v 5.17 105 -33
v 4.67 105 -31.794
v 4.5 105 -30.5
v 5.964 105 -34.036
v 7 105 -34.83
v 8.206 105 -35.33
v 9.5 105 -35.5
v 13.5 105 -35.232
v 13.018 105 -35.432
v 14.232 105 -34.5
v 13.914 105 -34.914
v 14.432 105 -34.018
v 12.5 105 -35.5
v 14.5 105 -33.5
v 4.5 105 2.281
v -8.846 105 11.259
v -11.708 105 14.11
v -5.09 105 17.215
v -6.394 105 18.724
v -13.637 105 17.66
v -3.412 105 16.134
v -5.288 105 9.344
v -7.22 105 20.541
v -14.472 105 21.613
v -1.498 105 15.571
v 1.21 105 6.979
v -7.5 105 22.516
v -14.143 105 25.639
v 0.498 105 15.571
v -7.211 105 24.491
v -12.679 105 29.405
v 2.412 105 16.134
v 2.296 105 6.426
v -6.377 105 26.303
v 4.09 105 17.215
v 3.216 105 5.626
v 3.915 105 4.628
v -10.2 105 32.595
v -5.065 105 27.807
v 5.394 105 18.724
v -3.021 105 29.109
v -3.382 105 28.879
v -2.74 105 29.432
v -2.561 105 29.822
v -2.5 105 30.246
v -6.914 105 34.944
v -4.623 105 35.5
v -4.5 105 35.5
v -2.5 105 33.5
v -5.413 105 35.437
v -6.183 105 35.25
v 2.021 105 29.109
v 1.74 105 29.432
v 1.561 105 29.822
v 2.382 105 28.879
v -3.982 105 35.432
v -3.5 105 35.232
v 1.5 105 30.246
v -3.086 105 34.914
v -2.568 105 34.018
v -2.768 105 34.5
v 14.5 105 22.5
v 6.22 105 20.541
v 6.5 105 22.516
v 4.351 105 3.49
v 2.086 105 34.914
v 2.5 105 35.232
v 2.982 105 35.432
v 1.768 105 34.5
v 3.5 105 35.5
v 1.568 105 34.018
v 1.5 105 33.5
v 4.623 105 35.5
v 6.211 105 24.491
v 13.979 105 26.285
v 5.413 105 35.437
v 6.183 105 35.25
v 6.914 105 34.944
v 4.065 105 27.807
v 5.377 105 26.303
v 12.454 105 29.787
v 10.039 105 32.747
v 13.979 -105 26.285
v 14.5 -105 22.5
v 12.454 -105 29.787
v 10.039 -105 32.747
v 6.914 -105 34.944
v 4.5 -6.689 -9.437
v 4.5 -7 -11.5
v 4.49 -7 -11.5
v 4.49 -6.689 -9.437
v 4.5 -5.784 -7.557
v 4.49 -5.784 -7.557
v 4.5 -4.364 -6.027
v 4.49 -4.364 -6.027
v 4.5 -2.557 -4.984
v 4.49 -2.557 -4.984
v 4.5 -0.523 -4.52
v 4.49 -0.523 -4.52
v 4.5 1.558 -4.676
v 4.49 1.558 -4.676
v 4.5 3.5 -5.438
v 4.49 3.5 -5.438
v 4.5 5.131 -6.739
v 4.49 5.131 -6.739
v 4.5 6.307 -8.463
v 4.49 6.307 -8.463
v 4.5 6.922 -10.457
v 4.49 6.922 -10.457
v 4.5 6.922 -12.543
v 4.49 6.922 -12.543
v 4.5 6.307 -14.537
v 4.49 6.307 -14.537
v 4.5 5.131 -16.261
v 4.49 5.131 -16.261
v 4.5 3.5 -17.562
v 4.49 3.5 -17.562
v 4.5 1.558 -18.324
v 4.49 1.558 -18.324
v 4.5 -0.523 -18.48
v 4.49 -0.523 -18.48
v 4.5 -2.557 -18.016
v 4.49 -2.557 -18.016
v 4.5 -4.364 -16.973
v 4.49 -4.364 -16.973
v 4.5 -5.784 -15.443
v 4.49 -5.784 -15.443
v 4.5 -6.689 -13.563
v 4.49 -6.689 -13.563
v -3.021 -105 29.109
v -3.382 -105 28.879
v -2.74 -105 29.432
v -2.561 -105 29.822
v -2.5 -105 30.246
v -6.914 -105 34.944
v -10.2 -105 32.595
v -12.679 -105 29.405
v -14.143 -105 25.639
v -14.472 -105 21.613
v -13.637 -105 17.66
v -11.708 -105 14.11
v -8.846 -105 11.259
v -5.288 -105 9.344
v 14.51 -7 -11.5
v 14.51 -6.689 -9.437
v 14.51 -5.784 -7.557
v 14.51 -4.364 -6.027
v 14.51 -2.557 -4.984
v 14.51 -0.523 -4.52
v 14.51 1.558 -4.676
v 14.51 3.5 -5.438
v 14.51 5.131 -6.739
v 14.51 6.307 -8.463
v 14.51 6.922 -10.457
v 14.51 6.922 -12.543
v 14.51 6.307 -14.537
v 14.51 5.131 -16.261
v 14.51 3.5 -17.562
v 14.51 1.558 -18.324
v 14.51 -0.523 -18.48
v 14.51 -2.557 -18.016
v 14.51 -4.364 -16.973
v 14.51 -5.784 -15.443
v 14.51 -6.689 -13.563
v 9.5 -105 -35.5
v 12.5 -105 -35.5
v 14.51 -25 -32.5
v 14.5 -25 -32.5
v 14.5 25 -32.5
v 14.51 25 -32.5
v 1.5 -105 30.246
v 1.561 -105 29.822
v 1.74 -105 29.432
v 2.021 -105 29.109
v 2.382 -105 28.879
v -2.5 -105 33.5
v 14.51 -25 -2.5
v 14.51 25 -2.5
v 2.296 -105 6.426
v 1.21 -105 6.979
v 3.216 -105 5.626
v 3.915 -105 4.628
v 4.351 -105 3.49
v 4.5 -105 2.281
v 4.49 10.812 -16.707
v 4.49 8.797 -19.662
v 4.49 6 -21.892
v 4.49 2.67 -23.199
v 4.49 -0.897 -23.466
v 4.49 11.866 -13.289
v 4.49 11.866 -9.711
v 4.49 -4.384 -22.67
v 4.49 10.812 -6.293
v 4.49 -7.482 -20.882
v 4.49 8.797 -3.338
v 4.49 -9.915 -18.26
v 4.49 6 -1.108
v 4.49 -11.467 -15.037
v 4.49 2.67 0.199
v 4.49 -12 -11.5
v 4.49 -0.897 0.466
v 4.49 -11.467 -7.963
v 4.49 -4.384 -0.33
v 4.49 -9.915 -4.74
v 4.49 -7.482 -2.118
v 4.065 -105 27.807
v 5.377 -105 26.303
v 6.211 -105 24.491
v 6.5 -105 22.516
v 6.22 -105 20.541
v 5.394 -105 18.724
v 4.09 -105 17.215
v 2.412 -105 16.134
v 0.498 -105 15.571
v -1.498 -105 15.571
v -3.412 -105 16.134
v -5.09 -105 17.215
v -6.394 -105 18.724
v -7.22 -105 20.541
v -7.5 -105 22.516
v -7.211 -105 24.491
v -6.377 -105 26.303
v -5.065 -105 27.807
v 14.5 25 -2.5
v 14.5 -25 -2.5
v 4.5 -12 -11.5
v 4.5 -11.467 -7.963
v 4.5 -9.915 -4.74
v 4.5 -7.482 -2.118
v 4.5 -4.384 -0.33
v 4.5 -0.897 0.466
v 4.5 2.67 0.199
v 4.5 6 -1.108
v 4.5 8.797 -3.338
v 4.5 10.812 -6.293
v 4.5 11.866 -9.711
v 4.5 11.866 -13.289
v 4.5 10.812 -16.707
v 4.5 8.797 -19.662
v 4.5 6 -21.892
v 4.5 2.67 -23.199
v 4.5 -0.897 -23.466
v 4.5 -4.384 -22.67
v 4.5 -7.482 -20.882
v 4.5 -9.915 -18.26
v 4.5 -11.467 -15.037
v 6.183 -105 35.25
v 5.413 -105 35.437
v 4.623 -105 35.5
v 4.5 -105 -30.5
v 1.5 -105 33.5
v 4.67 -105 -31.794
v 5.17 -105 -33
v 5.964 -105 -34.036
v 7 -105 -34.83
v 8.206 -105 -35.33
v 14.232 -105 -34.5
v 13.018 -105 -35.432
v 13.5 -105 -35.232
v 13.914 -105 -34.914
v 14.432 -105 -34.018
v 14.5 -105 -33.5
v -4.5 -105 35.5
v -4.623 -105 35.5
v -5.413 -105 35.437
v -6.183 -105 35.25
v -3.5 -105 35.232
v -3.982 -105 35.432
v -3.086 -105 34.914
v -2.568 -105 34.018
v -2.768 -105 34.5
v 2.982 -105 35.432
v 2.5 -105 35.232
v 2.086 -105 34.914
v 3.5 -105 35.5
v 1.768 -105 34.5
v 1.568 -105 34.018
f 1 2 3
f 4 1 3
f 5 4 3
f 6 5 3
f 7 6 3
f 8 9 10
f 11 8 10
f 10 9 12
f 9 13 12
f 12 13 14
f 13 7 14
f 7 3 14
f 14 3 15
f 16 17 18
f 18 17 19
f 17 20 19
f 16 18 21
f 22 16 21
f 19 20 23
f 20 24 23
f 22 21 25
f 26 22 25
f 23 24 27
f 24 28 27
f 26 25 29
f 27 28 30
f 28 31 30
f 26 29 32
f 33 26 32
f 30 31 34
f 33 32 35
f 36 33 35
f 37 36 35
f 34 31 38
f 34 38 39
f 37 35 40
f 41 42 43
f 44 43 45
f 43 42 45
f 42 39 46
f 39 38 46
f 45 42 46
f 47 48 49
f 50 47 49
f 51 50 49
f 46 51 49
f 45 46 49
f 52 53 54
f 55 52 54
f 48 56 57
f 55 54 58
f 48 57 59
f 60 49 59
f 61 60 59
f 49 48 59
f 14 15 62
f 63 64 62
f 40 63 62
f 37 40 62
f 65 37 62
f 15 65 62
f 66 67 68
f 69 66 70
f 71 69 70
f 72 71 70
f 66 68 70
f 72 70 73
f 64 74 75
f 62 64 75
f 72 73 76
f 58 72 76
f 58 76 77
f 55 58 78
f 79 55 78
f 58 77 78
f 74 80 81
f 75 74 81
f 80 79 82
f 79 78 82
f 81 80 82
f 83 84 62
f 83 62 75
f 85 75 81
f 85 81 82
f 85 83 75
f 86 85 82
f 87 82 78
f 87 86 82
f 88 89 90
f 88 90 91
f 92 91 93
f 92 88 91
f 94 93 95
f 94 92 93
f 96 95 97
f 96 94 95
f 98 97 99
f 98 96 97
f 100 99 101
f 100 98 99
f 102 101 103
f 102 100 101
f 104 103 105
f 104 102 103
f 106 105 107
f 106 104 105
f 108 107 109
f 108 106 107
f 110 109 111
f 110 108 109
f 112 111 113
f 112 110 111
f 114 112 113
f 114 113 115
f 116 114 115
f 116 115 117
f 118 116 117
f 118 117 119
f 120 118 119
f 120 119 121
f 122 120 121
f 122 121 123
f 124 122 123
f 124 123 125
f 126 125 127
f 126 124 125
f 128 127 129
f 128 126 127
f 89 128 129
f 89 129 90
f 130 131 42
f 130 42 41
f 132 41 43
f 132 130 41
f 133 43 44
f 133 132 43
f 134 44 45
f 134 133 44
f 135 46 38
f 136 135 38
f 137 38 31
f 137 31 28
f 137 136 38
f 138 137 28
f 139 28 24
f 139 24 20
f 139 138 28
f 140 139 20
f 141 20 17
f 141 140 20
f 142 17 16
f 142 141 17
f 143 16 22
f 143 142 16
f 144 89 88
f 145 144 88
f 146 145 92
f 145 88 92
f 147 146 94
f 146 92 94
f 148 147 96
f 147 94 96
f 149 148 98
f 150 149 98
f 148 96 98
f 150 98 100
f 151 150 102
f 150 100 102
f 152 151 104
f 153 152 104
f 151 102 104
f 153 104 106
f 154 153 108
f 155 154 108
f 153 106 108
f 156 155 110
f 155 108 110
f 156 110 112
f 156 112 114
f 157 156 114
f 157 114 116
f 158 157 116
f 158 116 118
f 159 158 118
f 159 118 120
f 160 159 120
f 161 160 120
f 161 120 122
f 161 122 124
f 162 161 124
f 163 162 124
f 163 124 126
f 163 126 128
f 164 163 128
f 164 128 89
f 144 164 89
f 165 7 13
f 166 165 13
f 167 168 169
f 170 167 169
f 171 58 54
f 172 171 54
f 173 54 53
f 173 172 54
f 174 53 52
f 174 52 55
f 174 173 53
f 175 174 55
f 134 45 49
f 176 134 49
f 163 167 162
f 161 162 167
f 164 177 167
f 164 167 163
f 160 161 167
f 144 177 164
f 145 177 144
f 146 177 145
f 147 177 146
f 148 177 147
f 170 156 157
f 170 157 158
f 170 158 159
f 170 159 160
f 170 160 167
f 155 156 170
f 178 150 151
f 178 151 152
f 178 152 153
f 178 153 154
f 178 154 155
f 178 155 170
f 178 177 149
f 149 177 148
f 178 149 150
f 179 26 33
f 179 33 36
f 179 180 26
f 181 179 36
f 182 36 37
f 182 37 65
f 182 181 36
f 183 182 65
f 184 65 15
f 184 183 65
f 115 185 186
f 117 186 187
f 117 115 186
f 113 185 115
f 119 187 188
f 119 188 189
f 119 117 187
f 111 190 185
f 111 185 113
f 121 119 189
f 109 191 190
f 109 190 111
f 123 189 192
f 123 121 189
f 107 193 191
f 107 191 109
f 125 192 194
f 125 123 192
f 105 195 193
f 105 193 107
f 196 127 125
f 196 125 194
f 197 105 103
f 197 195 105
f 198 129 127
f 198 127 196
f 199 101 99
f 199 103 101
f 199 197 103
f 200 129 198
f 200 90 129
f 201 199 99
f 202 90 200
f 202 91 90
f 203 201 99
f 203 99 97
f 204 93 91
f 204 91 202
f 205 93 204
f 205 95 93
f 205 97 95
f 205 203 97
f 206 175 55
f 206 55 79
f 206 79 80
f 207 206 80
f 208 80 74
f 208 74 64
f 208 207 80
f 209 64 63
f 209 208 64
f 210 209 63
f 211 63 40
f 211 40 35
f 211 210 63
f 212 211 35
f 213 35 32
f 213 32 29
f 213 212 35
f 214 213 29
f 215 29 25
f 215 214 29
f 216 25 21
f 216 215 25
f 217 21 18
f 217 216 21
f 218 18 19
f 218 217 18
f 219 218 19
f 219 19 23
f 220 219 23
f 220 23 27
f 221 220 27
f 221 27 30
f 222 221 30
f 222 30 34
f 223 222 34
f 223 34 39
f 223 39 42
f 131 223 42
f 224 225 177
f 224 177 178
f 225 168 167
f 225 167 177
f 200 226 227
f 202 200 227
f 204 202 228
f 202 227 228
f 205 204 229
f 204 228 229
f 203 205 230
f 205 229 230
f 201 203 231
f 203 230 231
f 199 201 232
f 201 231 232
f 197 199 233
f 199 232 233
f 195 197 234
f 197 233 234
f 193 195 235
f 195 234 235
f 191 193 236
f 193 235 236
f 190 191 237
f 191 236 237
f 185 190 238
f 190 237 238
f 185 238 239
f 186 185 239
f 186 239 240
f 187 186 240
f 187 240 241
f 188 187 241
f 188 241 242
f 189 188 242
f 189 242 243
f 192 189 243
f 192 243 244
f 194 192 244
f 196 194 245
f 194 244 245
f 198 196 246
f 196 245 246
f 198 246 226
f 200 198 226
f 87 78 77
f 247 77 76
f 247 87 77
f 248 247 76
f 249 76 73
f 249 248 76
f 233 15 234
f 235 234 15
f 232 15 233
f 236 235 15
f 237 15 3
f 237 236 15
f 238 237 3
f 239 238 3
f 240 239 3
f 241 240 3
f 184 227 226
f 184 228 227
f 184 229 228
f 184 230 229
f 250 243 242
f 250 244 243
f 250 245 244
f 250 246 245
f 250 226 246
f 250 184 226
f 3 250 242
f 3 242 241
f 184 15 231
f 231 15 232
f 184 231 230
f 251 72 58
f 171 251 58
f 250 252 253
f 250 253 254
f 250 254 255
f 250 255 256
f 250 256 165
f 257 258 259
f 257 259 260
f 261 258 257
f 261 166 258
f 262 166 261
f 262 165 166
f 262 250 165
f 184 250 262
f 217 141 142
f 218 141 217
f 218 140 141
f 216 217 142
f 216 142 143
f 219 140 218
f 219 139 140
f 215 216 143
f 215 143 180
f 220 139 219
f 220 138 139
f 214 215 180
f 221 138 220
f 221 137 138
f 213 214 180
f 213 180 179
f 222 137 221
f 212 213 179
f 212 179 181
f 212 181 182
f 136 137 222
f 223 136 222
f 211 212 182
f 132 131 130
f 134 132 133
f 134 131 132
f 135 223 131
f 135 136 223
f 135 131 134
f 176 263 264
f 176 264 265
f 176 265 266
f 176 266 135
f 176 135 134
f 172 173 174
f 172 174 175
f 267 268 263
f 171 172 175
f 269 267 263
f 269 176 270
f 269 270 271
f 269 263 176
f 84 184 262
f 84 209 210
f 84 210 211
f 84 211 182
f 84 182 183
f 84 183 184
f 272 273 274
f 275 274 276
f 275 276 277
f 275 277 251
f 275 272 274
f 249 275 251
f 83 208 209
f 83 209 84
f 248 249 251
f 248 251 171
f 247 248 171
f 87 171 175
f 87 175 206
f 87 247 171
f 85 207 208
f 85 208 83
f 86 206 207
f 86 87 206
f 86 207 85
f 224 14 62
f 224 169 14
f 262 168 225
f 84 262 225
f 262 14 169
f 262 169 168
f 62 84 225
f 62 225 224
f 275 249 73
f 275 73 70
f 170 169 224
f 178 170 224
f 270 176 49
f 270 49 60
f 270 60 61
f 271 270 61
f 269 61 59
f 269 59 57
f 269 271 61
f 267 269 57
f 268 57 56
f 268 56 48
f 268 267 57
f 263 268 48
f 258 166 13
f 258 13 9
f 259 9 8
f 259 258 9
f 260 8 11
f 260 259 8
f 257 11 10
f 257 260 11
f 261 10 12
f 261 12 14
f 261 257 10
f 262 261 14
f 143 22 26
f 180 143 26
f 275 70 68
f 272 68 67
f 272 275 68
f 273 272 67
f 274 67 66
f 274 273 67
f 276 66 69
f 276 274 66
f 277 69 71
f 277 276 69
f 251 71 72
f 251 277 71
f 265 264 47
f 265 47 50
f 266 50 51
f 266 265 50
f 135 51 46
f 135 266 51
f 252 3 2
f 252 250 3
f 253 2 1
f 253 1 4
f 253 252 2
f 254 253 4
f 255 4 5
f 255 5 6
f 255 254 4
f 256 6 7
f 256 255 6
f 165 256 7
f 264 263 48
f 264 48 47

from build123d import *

# Parameters (mm, degrees)
F1_DEPTH = 105
F2_R     = 12
F2_R_2   = 7
F3_DEPTH = 0.01
F4_W     = 50
F4_H     = 30
F5_DEPTH = 0.01
F6_DEPTH = 20


# Not quite as in the source:
# - ends of sketch curves that miss each other by under 0.0002 mm in the source are joined


with BuildPart() as f1:
    # F0 (on Front) → F1 (new body, symmetric)
    with BuildSketch(Plane.XZ):
        with BuildLine():
            Line((4.4999999997, -23.5), (4.4999999997, -30.5))
            ThreePointArc((4.4999999997, -30.5), (5.9644660938, -34.0355339059), (9.4999999997, -35.5))
            Line((9.4999999997, -35.5), (12.5, -35.5))
            ThreePointArc((12.5, -35.5), (13.9142133287, -34.9142135624), (14.4999997663, -33.5))
            Line((14.4999997663, -33.5), (14.4999997663, 22.4999994828))
            ThreePointArc((14.4999997663, 22.4999994828), (12.4539129776, 29.7872458033), (6.9137199183, 34.9444437777))
            ThreePointArc((6.9137199183, 34.9444437777), (5.8016169865, 35.3591259101), (4.6231056877, 35.4999993303))
            Line((4.6231056877, 35.4999993303), (3.4999997663, 35.4999993303))
            ThreePointArc((3.4999997663, 35.4999993303), (2.0857862039, 34.9142128927), (1.4999997663, 33.4999993303))
            Line((1.4999997663, 33.4999993303), (1.4999997663, 30.2459664828))
            ThreePointArc((1.4999997663, 30.2459664828), (1.7397477835, 29.4324771221), (2.3823530195, 28.8790310431))
            ThreePointArc((2.3823530195, 28.8790310431), (-0.5000000985, 15.4999997293), (-3.3823532363, 28.8790310342))
            ThreePointArc((-3.3823532363, 28.8790310342), (-2.7397478169, 29.4324771961), (-2.4999997997, 30.2459665567))
            Line((-2.4999997997, 30.2459665567), (-2.4999997997, 33.5))
            ThreePointArc((-2.4999997997, 33.5), (-3.0857862373, 34.9142132361), (-4.4999997997, 35.4999996738))
            Line((-4.4999997997, 35.4999996738), (-4.6231058319, 35.4999996738))
            ThreePointArc((-4.6231058319, 35.4999996738), (-5.8016171306, 35.3591262536), (-6.9137200625, 34.9444441212))
            ThreePointArc((-6.9137200625, 34.9444441212), (-14.4718653147, 21.6128794539), (-5.288282, 9.344303))
            Line((-5.288282, 9.344303), (1.210101, 6.979085))
            ThreePointArc((1.210101, 6.979085), (3.5957603078, 5.1485040574), (4.4999999997, 2.2806219993))
            Line((4.4999999997, 2.2806219993), (4.4999999997, 0.5))
            Line((4.4999999997, 0.5), (4.4999999997, -23.5))
        make_face()
    extrude(amount=F1_DEPTH, both=True)

    # F2 (on face) → F3 (join)
    with BuildSketch(Plane(origin=(4.4999999997, 0, 0), x_dir=(0, -1, 0), z_dir=(-1, 0, 0))):
        with Locations((0, -11.5)):
            Circle(F2_R)
        with Locations((0, -11.5)):
            Circle(F2_R_2, mode=Mode.SUBTRACT)
    extrude(amount=F3_DEPTH)

    # F4 (on face) → F5 (join)
    with BuildSketch(Plane.YZ.offset(14.4999997663)):
        with Locations((0, -17.5000005172)):
            Rectangle(F4_W, F4_H)
    extrude(amount=F5_DEPTH)

    # F6 (cut): a face of the model
    f6_faces = [f1.faces().sort_by_distance(p)[0] for p in [
        (4.4999999997, 0, -11.5),
    ]]
    extrude(f6_faces, amount=-F6_DEPTH, mode=Mode.SUBTRACT)


solid = f1.part
